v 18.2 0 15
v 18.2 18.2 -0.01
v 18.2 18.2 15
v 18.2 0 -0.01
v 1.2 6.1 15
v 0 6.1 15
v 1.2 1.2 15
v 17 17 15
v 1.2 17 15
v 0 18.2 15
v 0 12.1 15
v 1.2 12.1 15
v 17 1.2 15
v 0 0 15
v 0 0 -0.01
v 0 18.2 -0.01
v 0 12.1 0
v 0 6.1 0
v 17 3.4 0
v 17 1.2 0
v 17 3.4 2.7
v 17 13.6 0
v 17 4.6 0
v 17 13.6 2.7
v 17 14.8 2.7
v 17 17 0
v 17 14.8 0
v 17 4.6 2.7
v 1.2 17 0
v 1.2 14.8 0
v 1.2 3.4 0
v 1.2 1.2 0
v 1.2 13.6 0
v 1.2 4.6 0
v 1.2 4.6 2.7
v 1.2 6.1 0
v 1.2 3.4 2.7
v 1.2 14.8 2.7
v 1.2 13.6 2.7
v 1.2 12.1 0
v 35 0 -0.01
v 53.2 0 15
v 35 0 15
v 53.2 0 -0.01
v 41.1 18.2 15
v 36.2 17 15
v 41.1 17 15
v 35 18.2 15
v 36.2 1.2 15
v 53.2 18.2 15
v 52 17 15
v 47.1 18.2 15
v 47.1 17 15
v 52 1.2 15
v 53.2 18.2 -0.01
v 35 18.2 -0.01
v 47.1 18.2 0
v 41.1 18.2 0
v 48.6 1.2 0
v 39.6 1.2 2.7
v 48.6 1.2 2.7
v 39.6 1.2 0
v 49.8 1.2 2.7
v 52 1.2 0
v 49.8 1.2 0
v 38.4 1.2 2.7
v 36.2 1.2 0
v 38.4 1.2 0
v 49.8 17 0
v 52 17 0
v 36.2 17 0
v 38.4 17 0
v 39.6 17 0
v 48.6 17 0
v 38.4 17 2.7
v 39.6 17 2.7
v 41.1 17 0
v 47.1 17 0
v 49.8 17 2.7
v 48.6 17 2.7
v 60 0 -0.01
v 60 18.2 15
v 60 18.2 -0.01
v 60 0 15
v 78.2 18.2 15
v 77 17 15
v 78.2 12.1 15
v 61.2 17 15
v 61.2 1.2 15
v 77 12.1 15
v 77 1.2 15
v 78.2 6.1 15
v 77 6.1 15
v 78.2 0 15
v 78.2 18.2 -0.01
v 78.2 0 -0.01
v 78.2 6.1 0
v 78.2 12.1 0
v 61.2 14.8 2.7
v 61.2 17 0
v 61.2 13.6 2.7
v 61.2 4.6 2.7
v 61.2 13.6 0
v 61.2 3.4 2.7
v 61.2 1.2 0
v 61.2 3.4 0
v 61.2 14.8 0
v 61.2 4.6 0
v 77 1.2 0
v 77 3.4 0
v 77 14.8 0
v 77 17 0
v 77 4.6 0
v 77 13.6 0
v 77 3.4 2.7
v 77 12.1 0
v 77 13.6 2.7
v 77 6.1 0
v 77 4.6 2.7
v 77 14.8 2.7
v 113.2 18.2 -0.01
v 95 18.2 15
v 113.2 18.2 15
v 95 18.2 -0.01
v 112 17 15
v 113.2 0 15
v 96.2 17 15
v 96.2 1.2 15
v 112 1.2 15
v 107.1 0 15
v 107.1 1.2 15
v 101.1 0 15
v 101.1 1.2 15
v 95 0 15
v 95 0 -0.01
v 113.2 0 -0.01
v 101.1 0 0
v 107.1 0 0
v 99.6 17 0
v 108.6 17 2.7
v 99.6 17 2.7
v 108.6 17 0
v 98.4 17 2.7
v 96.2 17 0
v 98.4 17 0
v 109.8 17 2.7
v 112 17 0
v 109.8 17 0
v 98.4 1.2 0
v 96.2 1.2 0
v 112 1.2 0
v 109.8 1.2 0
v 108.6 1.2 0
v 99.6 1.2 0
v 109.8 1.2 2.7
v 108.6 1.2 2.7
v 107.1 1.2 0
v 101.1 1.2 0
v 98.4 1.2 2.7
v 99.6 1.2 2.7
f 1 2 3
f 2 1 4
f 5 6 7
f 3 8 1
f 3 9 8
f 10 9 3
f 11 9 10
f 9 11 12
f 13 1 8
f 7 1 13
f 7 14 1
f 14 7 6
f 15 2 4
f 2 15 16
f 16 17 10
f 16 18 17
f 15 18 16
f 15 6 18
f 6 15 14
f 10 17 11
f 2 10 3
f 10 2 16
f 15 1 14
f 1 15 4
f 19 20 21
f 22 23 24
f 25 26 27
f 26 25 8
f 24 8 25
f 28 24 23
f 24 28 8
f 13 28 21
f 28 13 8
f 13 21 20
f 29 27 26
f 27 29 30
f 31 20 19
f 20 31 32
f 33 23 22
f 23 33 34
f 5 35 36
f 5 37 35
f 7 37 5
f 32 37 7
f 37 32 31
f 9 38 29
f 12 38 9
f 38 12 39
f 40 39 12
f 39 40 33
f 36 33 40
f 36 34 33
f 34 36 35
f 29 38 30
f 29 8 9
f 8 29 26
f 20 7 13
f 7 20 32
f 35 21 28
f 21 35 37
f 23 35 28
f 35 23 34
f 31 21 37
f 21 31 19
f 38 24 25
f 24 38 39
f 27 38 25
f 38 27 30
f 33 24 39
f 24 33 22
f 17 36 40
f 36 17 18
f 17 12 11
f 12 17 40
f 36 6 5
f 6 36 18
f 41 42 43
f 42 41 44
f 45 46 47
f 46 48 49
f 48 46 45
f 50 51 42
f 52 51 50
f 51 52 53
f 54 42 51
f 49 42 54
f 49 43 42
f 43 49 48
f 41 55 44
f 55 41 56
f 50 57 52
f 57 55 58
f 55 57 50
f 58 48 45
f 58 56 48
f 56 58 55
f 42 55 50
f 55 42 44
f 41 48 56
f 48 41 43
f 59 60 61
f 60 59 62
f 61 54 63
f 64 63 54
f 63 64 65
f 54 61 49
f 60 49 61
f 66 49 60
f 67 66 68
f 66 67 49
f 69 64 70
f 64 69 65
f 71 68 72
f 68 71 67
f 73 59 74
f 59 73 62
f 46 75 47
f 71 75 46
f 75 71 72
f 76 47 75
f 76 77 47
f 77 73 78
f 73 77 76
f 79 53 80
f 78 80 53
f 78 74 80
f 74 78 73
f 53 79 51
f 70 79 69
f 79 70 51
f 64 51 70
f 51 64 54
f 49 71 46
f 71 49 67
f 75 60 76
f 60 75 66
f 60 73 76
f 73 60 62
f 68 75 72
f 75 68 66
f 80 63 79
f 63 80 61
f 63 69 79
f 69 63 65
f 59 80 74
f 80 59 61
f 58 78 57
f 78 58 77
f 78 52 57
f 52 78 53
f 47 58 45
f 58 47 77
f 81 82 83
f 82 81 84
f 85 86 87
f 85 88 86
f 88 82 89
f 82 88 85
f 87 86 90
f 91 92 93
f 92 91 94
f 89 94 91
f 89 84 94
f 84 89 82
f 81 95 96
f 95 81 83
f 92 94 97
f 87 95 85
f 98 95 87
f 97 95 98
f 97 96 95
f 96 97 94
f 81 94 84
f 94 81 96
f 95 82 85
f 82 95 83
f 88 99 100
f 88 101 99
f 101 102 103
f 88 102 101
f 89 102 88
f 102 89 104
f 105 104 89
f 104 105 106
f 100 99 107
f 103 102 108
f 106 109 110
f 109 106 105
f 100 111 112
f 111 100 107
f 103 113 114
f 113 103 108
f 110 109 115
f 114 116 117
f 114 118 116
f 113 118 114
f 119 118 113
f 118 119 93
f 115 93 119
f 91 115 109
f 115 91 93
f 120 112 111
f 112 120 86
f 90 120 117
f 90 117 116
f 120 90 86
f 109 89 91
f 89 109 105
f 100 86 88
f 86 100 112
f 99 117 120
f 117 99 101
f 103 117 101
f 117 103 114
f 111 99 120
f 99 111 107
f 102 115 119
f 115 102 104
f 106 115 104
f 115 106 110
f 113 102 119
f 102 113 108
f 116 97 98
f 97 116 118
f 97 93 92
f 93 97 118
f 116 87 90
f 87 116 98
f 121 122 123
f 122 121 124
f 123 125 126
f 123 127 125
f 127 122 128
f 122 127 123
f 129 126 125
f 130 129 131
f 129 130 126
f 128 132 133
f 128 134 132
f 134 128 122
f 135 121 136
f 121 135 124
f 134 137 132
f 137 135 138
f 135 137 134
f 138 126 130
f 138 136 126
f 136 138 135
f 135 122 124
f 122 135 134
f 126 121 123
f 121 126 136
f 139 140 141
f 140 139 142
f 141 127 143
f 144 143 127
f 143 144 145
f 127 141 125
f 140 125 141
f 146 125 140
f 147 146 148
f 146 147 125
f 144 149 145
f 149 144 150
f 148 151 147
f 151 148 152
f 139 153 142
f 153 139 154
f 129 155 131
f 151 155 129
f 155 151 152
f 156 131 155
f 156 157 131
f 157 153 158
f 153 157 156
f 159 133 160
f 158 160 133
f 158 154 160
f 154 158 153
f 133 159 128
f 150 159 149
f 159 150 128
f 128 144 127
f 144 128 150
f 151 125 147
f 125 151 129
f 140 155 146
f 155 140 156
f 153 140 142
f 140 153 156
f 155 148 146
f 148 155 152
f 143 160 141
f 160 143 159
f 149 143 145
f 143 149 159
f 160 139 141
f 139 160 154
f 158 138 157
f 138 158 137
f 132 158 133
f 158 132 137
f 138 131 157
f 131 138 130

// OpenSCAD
// file: ../../Elements/FrameBlockWithPin.scad
// Fischertechnik Box Library
// Frame for Building Blocks with Connector
// 38240, 37636

use <../Base/Constants.scad>
use <../ModelBase/Simple.scad>

width = 15;
depth = 15;
height = 8;

// getFrameBlockWithPinSpace()
// Gets the space the frame block with pin needs as width (.x and .y as a list)
// for the specified count of blocks

function getFrameBlockWithPinSpace(count = 1) = getFrameOuterVolume([width * count, depth, height]);

// FrameBlockWithPin(count, height=8)
// Frame for count standing building blocks with pin down
// count = Count of blocks
// height = Height of the frame (default is 8)

module FrameBlockWithPin(count = 1, height=height) {
    railWidth = getFrameBlockWithPinSpace(count).x;
    railHeight = 2.7;
    railDistance = 9;
    
    module Rails() {
        Wall([railWidth, getDividerThickness(), railHeight]);
        translate([0, railDistance + getDividerThickness()])
            Wall([railWidth, getDividerThickness(), railHeight]);
    }

    Frame([width*count, depth, height]);

    railsDepth = railDistance + 2*getDividerThickness();

    translate([0, (getFrameBlockWithPinSpace(count).y - railsDepth) / 2]) 
        Rails();
}

// Test
count = 2;
color("lightgray") {
FrameBlockWithPin(count);
}
// file: ../../Base/Boxes.scad
// Fischertechnik Box Foundation
// Pre-designed Boxes

use <Constants.scad>

include <PlacementOptions.scad>

box190Width = 190;
box190Depth = 130;
box130Width = 130;
box130Depth = 95;
boxUsageHeight = 33.9;
boxWallThickness = 2.4;
boxBaseThickness = 1.0;

// getBoxWallThickness()
// Gets the wall thickness of a Fischertechnik Box

function getBoxWallThickness() = boxWallThickness;

// Gets the usable height of a fischertechnik box
function getBoxUsageHeight() = boxUsageHeight;

// Gets the thickness of the Fischertechnik box base.
function getBoxBaseThickness() = boxBaseThickness;

// Gets the usable inner space of a Box 190 as an x/y-list
function getBox190Space() = [
    box190Width - 2*getBoxWallThickness(), 
    box190Depth - 2*getBoxWallThickness() ];

// Imports the Fischertechnik empty box 130x190 mm and places it at position 0,0
// 190x130 are the outer sizes, the inner space is slightly smaller. Use getBox190Space() to get the inner sizes.
// This module needs the STL file "Fischertechnik Box 130x190.stl" in the library path.
// The box is positioned that the usable inner space is at the 0,0,0 position. The

module Box190() {
    translate([-getBoxWallThickness(),-getBoxWallThickness(),-getBoxBaseThickness()])
        import("Fischertechnik Box 130x190.stl", convexity=3);
}

// Gets the usable inner space of a Box 130 as an x/y-list
function getBox130Space() = [
    box130Width - 2*getBoxWallThickness(), 
    box130Depth - 2*getBoxWallThickness() ];

// Imports the Fischertechnik empty box 95x130 mm and places it at position 0,0
// 190x130 are the outer sizes, the inner space is slightly smaller. Use getBox190Space() to get the inner sizes.
// This module needs the STL file "Fischertechnik Box 95x130.stl" in the library path.
// The box is positioned that the usable inner space is at the 0,0,0 position. The

module Box130() {
    translate([-getBoxWallThickness(),-getBoxWallThickness(),-getBoxBaseThickness()])
        import("Fischertechnik Box 95x130.stl", convexity=3);
}

// Creates a web at the specified box walls
// corner 0 = LowerLeft, 1 = UpperLeft, 2 = UpperRight, 3 = LowerRight
// side 0 = LeftOfCorner, 1 = RightOfCorner
// distance = Distance in mm from the corner
// box = inner width and depth of the box (default: Box 190)
// webWidth = length of the web (default is 3 mms)
// webThickness = thickness of the web (default is 1 mm)

module BoxWeb(corner, side, distance, box=getBox190Space(), webWidth=3, webThickness=1.0) {
    sink = getBoxWallThickness()/2;

    width = (corner % 2 == 0) ? 
            (side == LeftOfCorner ? webWidth : webThickness) :
            (side == LeftOfCorner ? webThickness : webWidth);

    depth = (corner % 2 == 0) ? 
            (side == RightOfCorner ? webWidth : webThickness) :
            (side == RightOfCorner ? webThickness : webWidth);
    
    xDiff = corner == LowerLeft ? 
                (side == LeftOfCorner ? -sink : distance) :
            (corner == UpperLeft ?                
                (side == LeftOfCorner ? distance : -sink) :
            (corner == UpperRight ?
                (side == LeftOfCorner ? box.x-webWidth+sink : box.x-distance-webThickness) :
                (side == LeftOfCorner ? box.x-distance-webThickness: box.x-webWidth+sink)));

    yDiff = corner == LowerLeft ? 
                (side == RightOfCorner ? -sink : distance) :
            (corner == UpperLeft ?
                (side == RightOfCorner ? box.y-distance : box.y-webWidth+sink) :
            (corner == UpperRight ?
                (side == RightOfCorner ? box.y-webWidth+sink : box.y-distance) :
                (side == RightOfCorner ? distance : -sink)));
    
    translate([xDiff, yDiff, -getExcess()])
        cube([width, depth, boxUsageHeight + 2*getExcess()]);
}
// file: ../../Base/Rotation.scad
// Fischertechnik Box Foundation
// Geometry Helpers Rotation

include <PlacementOptions.scad>

// getRotatedSpace(space, rotation=NoRotation)
// Rotates the space dependent on the specified rotation

function getRotatedSpace(space, rotation=NoRotation) = [
    (rotation == Rotate90 || rotation == Rotate270) ? space.y : space.x,
    (rotation == Rotate90 || rotation == Rotate270) ? space.x : space.y
];

// Rotates the given space around the fixed left lower corner
// space = the space the children needs as width/depth list [width,depth]
// rotation = 0 Rotate0 degrees, 1 Rotate90 degrees, 2 Rotate180 degrees, 3 Rotate270 degrees (equivalent to -90)

module RotateFix(space, rotation=Rotate0) {
    dy = (rotation == Rotate0 || rotation == Rotate270) ? 0 :
        (rotation == Rotate90) ? space.x :
        space.y;
    dx = (rotation < Rotate180) ? 0 :
        (rotation == Rotate180) ? space.x :
        space.y;
    
    translate([dx, dy, 0])
        rotate([0, 0, rotations[rotation]])
            children();
}
// file: ../../Base/Alignment.scad
// Fischertechnik Box Foundation
// Geometry Helpers Alignment

include <PlacementOptions.scad>

// getAlignedX(elementWidth, spaceWidth, align=AlignRight, offset=0)
// Gets the aligned X offset of an element with the given
// width in the given space.
// elementWidth = The width of the element to positon
// spaceWidth = The space where the element should be aligned
// align = 0 AlignLeft, 1 AlignCenter, 2 AlignRight
// offset = an optional offset from the aligned position. When
// aligned left or centered, then positive values are in X direction.
// When aligned right then positive values are in negative X direction.

function getAlignedX(elementWidth, spaceWidth, align=AlignRight, offset=0) =
    (align == AlignLeft) ?
        offset :
        ((align == AlignCenter) ?
        (spaceWidth - elementWidth)/2 + offset :
        spaceWidth - offset - elementWidth);

// getAlignedY(elementDepth, spaceDepth, align=AlignTop, offset=0)
// Gets the aligned Y offset of an element with the given
// depth in the given space.
// elementDepth = The depth of the element to positon
// spaceDepth = The space where the element should be aligned
// align = 0 AlignBottom, 1 AlignCenter, 2 AlignTop
// offset = an optional offset from the aligned position. When
// aligned bottom or centered, then positive values are in Y direction.
// When aligned top then positive values are in negative Y direction.

function getAlignedY(elementDepth, spaceDepth, align=AlignTop, offset=0) =
    (align == AlignBottom) ?
        offset :
        ((align == AlignCenter) ?
        (spaceDepth - elementDepth)/2 + offset :
        spaceDepth - offset - elementDepth);
// file: ../../Base/Constants.scad
// Fischertechnik Box Foundation
// Constants

// Constant values necessary for multiple elements

// Base constants
dividerThickness = 1.2;
excess = 0.01;
fragments = 90;
tolerance = 0.8;

// Gets the thickness of a divider 
function getDividerThickness() = dividerThickness;

// Gets the excess that is used to merge walls into each other
function getExcess() = excess;

// Gets amount of fragments of a cylinder
function getFragments() = fragments;

// Gets the inner tolerance of a frame to each side
function getTolerance() = tolerance;


// Fischertechnik specific constants
axisDiameter = 4;
axisBottomDiameter = axisDiameter + 1;
standardEdgeDistance = 2.5;
standardWebDistance = 11.5;
standardCornerLength = 15;
tubeWallFactor = 1.6;

// Gets axis diameter
function getAxisDiameter() = axisDiameter;

// Gets axis bottom diameter for thicker part at the bottom
function getAxisBottomDiameter() = axisBottomDiameter;

// gets the standard distance to the wall of the box for dockable frames with webs
function getStandardEdgeDistance() = standardEdgeDistance;

// gets the standard distance of each web to the corner of the dockable frame
function getStandardWebDistance() = standardWebDistance;

// gets the standard length of the corner walls of a dockable frame
function getStandardCornerLength() = standardCornerLength;

// gets the wall thickness of a tube.
function getTubeWallThickness() = tubeWallFactor * getDividerThickness();
// file: ../../Base/PlacementOptions.scad
// Fischertechnik Box Foundation
// Placement Options

// Alignment
NoAlign = 0;
AlignLeft = 1;
AlignBottom = 2;
AlignCenter = 3;
AlignRight = 4;
AlignTop = 5;

// Element rotation degree steps
rotations = [0, -90, -180, -270];

// Rotation
NoRotation = 0;
Rotate0 = 0;
Rotate90 = 1;
Rotate180 = 2;
Rotate270 = 3;

// Docking (seen from above)
NoDock = -1;
DockLeft = 0;
DockTop = 1;
DockRight = 2;
DockCorner = 2;
DockBottom = 3;

// Web corners
LowerLeft = 0;
UpperLeft = 1;
UpperRight = 2;
LowerRight = 3;

// Web position relative to corner
LeftOfCorner = 0;
RightOfCorner = 1;
// file: ../../Elements/FramePhotoResistor30.scad
// Fischertechnik Box Library
// Frame for Light Resistor 30
// 31361

use <../Base/Constants.scad>
use <../ModelBase/Simple.scad>
use <FrameBlockWithPin.scad>

width = 15;
depth = 15;
height = 15;

// getFramePhotoResistor30Space()
// Gets the space the frame for photo resistor 30 needs as width (.x and .y as a list)

function getFramePhotoResistor30Space() = getFrameOuterVolume([width, depth, height]);

// FramePhotoResistor30()
// Frame for photo resistor 30

module FramePhotoResistor30() {
    gapWidth = 6;
    
    difference() {
        FrameBlockWithPin(height=height);
        translate([-getDividerThickness()/2,(getFramePhotoResistor30Space().y-gapWidth)/2])
            cube([getDividerThickness()*2, gapWidth, height + 1]);
    }
}

// Test
color("lightgray") {
    FramePhotoResistor30();
}
// file: ../../Base/Placement.scad
// Fischertechnik Box Foundation
// Geometry Helpers Placement

use <Constants.scad>
use <Alignment.scad>
use <Rotation.scad>
use <Boxes.scad>

include <PlacementOptions.scad>

// Place(x=0, y=0, elementSpace=[0,0], alignX=AlignLeft, alignY=AlignBottom, rotation=Rotate0, boxSpace=getBox190Space())
// Places the child at the specified position
// y = Y-Position. This is a relative position when an X aligment is specified.
// x = X-Position. This is a relative position when an Y aligment is specified.
// elementSpace = space of the element to be placed [x,y]
// alignX = -1=NoAlign, 0 AlignLeft, 1 AlignCenter, 3 AlignRight (elementSpace and boxSpace required!)
// alignY = -1=NoAlign, 2 AlignBottom, 1 AlignCenter, 4 AlignTop (elementSpace and boxSpace required!)
// rotation = 0 Rotate0 0 degrees, 1 Rotate90 90 degrees, 
// 2 Rotate180 180 degrees, 3 Rotate270 270 degrees (equivalent to -90)
// boxSpace = Inner space of the box where the placement occurs [x,y] - default is Box 190x130 inner space

module Place(x=0, y=0, elementSpace=[0,0], 
  alignX=AlignLeft, alignY=AlignBottom, 
  rotation=NoRotation, boxSpace=getBox190Space()) {

    module Position(x, y, space, rotation=Rotate0) {
        translate([x, y, 0])
            RotateFix(space, rotation)
                children(0);
    }

    space = getRotatedSpace(elementSpace, rotation);
    alignedX = getAlignedX(space.x, boxSpace.x, alignX, x);
    alignedY = getAlignedY(space.y, boxSpace.y, alignY, y);
    Position(alignedX, alignedY, elementSpace, rotation)
        children(0);
}

// Center(space=getBox130Space(), elementSpace=[0,0])
// space = Space where the children is centered. For cylinder use centered=true and no elementSpace.
// elementSpace = space of the element to be centered [x,y]

module Center(space=getBox190Space(), elementSpace=[0,0]) {
    translate([(space.x - elementSpace.x) / 2, (space.y - elementSpace.y) / 2])
        children(0);
}

// CenterHorizontal(width=0, y=0, offset=0, space=getBox130Space())
// space = Space where the children is centered. For cylinder use centered=true and no elementSpace.
// elementSpace = space of the element to be centered [x,y]

module CenterHorizontal(width=0, y=0, offset=0, space=getBox190Space()) {
    translate([(space.x - width) / 2 + offset, y])
        children(0);
}

// CenterVertical(depth=0, x=0, offset=0, space=getBox130Space())
// space = Space where the children is centered. For cylinder use centered=true and no elementSpace.
// elementSpace = space of the element to be centered [x,y]

module CenterVerticalal(depth=0, x=0, offset=0, space=getBox190Space()) {
    translate([x, (space.y - depth) / 2 + offset])
        children(0);
}
// main file
// Fischertechnik Box Foundation
// Elements
// Test FramePhotoResistor30

use <../../Base/Placement.scad>
use <../../Elements/FramePhotoResistor30.scad>

include <../../Base/PlacementOptions.scad>

FramePhotoResistor30();

Place(35, 0, getFramePhotoResistor30Space(), rotation=Rotate90)
    FramePhotoResistor30();

Place(60, 0, getFramePhotoResistor30Space(), rotation=Rotate180)
    FramePhotoResistor30();

Place(95, 0, getFramePhotoResistor30Space(), rotation=Rotate270)
    FramePhotoResistor30();
